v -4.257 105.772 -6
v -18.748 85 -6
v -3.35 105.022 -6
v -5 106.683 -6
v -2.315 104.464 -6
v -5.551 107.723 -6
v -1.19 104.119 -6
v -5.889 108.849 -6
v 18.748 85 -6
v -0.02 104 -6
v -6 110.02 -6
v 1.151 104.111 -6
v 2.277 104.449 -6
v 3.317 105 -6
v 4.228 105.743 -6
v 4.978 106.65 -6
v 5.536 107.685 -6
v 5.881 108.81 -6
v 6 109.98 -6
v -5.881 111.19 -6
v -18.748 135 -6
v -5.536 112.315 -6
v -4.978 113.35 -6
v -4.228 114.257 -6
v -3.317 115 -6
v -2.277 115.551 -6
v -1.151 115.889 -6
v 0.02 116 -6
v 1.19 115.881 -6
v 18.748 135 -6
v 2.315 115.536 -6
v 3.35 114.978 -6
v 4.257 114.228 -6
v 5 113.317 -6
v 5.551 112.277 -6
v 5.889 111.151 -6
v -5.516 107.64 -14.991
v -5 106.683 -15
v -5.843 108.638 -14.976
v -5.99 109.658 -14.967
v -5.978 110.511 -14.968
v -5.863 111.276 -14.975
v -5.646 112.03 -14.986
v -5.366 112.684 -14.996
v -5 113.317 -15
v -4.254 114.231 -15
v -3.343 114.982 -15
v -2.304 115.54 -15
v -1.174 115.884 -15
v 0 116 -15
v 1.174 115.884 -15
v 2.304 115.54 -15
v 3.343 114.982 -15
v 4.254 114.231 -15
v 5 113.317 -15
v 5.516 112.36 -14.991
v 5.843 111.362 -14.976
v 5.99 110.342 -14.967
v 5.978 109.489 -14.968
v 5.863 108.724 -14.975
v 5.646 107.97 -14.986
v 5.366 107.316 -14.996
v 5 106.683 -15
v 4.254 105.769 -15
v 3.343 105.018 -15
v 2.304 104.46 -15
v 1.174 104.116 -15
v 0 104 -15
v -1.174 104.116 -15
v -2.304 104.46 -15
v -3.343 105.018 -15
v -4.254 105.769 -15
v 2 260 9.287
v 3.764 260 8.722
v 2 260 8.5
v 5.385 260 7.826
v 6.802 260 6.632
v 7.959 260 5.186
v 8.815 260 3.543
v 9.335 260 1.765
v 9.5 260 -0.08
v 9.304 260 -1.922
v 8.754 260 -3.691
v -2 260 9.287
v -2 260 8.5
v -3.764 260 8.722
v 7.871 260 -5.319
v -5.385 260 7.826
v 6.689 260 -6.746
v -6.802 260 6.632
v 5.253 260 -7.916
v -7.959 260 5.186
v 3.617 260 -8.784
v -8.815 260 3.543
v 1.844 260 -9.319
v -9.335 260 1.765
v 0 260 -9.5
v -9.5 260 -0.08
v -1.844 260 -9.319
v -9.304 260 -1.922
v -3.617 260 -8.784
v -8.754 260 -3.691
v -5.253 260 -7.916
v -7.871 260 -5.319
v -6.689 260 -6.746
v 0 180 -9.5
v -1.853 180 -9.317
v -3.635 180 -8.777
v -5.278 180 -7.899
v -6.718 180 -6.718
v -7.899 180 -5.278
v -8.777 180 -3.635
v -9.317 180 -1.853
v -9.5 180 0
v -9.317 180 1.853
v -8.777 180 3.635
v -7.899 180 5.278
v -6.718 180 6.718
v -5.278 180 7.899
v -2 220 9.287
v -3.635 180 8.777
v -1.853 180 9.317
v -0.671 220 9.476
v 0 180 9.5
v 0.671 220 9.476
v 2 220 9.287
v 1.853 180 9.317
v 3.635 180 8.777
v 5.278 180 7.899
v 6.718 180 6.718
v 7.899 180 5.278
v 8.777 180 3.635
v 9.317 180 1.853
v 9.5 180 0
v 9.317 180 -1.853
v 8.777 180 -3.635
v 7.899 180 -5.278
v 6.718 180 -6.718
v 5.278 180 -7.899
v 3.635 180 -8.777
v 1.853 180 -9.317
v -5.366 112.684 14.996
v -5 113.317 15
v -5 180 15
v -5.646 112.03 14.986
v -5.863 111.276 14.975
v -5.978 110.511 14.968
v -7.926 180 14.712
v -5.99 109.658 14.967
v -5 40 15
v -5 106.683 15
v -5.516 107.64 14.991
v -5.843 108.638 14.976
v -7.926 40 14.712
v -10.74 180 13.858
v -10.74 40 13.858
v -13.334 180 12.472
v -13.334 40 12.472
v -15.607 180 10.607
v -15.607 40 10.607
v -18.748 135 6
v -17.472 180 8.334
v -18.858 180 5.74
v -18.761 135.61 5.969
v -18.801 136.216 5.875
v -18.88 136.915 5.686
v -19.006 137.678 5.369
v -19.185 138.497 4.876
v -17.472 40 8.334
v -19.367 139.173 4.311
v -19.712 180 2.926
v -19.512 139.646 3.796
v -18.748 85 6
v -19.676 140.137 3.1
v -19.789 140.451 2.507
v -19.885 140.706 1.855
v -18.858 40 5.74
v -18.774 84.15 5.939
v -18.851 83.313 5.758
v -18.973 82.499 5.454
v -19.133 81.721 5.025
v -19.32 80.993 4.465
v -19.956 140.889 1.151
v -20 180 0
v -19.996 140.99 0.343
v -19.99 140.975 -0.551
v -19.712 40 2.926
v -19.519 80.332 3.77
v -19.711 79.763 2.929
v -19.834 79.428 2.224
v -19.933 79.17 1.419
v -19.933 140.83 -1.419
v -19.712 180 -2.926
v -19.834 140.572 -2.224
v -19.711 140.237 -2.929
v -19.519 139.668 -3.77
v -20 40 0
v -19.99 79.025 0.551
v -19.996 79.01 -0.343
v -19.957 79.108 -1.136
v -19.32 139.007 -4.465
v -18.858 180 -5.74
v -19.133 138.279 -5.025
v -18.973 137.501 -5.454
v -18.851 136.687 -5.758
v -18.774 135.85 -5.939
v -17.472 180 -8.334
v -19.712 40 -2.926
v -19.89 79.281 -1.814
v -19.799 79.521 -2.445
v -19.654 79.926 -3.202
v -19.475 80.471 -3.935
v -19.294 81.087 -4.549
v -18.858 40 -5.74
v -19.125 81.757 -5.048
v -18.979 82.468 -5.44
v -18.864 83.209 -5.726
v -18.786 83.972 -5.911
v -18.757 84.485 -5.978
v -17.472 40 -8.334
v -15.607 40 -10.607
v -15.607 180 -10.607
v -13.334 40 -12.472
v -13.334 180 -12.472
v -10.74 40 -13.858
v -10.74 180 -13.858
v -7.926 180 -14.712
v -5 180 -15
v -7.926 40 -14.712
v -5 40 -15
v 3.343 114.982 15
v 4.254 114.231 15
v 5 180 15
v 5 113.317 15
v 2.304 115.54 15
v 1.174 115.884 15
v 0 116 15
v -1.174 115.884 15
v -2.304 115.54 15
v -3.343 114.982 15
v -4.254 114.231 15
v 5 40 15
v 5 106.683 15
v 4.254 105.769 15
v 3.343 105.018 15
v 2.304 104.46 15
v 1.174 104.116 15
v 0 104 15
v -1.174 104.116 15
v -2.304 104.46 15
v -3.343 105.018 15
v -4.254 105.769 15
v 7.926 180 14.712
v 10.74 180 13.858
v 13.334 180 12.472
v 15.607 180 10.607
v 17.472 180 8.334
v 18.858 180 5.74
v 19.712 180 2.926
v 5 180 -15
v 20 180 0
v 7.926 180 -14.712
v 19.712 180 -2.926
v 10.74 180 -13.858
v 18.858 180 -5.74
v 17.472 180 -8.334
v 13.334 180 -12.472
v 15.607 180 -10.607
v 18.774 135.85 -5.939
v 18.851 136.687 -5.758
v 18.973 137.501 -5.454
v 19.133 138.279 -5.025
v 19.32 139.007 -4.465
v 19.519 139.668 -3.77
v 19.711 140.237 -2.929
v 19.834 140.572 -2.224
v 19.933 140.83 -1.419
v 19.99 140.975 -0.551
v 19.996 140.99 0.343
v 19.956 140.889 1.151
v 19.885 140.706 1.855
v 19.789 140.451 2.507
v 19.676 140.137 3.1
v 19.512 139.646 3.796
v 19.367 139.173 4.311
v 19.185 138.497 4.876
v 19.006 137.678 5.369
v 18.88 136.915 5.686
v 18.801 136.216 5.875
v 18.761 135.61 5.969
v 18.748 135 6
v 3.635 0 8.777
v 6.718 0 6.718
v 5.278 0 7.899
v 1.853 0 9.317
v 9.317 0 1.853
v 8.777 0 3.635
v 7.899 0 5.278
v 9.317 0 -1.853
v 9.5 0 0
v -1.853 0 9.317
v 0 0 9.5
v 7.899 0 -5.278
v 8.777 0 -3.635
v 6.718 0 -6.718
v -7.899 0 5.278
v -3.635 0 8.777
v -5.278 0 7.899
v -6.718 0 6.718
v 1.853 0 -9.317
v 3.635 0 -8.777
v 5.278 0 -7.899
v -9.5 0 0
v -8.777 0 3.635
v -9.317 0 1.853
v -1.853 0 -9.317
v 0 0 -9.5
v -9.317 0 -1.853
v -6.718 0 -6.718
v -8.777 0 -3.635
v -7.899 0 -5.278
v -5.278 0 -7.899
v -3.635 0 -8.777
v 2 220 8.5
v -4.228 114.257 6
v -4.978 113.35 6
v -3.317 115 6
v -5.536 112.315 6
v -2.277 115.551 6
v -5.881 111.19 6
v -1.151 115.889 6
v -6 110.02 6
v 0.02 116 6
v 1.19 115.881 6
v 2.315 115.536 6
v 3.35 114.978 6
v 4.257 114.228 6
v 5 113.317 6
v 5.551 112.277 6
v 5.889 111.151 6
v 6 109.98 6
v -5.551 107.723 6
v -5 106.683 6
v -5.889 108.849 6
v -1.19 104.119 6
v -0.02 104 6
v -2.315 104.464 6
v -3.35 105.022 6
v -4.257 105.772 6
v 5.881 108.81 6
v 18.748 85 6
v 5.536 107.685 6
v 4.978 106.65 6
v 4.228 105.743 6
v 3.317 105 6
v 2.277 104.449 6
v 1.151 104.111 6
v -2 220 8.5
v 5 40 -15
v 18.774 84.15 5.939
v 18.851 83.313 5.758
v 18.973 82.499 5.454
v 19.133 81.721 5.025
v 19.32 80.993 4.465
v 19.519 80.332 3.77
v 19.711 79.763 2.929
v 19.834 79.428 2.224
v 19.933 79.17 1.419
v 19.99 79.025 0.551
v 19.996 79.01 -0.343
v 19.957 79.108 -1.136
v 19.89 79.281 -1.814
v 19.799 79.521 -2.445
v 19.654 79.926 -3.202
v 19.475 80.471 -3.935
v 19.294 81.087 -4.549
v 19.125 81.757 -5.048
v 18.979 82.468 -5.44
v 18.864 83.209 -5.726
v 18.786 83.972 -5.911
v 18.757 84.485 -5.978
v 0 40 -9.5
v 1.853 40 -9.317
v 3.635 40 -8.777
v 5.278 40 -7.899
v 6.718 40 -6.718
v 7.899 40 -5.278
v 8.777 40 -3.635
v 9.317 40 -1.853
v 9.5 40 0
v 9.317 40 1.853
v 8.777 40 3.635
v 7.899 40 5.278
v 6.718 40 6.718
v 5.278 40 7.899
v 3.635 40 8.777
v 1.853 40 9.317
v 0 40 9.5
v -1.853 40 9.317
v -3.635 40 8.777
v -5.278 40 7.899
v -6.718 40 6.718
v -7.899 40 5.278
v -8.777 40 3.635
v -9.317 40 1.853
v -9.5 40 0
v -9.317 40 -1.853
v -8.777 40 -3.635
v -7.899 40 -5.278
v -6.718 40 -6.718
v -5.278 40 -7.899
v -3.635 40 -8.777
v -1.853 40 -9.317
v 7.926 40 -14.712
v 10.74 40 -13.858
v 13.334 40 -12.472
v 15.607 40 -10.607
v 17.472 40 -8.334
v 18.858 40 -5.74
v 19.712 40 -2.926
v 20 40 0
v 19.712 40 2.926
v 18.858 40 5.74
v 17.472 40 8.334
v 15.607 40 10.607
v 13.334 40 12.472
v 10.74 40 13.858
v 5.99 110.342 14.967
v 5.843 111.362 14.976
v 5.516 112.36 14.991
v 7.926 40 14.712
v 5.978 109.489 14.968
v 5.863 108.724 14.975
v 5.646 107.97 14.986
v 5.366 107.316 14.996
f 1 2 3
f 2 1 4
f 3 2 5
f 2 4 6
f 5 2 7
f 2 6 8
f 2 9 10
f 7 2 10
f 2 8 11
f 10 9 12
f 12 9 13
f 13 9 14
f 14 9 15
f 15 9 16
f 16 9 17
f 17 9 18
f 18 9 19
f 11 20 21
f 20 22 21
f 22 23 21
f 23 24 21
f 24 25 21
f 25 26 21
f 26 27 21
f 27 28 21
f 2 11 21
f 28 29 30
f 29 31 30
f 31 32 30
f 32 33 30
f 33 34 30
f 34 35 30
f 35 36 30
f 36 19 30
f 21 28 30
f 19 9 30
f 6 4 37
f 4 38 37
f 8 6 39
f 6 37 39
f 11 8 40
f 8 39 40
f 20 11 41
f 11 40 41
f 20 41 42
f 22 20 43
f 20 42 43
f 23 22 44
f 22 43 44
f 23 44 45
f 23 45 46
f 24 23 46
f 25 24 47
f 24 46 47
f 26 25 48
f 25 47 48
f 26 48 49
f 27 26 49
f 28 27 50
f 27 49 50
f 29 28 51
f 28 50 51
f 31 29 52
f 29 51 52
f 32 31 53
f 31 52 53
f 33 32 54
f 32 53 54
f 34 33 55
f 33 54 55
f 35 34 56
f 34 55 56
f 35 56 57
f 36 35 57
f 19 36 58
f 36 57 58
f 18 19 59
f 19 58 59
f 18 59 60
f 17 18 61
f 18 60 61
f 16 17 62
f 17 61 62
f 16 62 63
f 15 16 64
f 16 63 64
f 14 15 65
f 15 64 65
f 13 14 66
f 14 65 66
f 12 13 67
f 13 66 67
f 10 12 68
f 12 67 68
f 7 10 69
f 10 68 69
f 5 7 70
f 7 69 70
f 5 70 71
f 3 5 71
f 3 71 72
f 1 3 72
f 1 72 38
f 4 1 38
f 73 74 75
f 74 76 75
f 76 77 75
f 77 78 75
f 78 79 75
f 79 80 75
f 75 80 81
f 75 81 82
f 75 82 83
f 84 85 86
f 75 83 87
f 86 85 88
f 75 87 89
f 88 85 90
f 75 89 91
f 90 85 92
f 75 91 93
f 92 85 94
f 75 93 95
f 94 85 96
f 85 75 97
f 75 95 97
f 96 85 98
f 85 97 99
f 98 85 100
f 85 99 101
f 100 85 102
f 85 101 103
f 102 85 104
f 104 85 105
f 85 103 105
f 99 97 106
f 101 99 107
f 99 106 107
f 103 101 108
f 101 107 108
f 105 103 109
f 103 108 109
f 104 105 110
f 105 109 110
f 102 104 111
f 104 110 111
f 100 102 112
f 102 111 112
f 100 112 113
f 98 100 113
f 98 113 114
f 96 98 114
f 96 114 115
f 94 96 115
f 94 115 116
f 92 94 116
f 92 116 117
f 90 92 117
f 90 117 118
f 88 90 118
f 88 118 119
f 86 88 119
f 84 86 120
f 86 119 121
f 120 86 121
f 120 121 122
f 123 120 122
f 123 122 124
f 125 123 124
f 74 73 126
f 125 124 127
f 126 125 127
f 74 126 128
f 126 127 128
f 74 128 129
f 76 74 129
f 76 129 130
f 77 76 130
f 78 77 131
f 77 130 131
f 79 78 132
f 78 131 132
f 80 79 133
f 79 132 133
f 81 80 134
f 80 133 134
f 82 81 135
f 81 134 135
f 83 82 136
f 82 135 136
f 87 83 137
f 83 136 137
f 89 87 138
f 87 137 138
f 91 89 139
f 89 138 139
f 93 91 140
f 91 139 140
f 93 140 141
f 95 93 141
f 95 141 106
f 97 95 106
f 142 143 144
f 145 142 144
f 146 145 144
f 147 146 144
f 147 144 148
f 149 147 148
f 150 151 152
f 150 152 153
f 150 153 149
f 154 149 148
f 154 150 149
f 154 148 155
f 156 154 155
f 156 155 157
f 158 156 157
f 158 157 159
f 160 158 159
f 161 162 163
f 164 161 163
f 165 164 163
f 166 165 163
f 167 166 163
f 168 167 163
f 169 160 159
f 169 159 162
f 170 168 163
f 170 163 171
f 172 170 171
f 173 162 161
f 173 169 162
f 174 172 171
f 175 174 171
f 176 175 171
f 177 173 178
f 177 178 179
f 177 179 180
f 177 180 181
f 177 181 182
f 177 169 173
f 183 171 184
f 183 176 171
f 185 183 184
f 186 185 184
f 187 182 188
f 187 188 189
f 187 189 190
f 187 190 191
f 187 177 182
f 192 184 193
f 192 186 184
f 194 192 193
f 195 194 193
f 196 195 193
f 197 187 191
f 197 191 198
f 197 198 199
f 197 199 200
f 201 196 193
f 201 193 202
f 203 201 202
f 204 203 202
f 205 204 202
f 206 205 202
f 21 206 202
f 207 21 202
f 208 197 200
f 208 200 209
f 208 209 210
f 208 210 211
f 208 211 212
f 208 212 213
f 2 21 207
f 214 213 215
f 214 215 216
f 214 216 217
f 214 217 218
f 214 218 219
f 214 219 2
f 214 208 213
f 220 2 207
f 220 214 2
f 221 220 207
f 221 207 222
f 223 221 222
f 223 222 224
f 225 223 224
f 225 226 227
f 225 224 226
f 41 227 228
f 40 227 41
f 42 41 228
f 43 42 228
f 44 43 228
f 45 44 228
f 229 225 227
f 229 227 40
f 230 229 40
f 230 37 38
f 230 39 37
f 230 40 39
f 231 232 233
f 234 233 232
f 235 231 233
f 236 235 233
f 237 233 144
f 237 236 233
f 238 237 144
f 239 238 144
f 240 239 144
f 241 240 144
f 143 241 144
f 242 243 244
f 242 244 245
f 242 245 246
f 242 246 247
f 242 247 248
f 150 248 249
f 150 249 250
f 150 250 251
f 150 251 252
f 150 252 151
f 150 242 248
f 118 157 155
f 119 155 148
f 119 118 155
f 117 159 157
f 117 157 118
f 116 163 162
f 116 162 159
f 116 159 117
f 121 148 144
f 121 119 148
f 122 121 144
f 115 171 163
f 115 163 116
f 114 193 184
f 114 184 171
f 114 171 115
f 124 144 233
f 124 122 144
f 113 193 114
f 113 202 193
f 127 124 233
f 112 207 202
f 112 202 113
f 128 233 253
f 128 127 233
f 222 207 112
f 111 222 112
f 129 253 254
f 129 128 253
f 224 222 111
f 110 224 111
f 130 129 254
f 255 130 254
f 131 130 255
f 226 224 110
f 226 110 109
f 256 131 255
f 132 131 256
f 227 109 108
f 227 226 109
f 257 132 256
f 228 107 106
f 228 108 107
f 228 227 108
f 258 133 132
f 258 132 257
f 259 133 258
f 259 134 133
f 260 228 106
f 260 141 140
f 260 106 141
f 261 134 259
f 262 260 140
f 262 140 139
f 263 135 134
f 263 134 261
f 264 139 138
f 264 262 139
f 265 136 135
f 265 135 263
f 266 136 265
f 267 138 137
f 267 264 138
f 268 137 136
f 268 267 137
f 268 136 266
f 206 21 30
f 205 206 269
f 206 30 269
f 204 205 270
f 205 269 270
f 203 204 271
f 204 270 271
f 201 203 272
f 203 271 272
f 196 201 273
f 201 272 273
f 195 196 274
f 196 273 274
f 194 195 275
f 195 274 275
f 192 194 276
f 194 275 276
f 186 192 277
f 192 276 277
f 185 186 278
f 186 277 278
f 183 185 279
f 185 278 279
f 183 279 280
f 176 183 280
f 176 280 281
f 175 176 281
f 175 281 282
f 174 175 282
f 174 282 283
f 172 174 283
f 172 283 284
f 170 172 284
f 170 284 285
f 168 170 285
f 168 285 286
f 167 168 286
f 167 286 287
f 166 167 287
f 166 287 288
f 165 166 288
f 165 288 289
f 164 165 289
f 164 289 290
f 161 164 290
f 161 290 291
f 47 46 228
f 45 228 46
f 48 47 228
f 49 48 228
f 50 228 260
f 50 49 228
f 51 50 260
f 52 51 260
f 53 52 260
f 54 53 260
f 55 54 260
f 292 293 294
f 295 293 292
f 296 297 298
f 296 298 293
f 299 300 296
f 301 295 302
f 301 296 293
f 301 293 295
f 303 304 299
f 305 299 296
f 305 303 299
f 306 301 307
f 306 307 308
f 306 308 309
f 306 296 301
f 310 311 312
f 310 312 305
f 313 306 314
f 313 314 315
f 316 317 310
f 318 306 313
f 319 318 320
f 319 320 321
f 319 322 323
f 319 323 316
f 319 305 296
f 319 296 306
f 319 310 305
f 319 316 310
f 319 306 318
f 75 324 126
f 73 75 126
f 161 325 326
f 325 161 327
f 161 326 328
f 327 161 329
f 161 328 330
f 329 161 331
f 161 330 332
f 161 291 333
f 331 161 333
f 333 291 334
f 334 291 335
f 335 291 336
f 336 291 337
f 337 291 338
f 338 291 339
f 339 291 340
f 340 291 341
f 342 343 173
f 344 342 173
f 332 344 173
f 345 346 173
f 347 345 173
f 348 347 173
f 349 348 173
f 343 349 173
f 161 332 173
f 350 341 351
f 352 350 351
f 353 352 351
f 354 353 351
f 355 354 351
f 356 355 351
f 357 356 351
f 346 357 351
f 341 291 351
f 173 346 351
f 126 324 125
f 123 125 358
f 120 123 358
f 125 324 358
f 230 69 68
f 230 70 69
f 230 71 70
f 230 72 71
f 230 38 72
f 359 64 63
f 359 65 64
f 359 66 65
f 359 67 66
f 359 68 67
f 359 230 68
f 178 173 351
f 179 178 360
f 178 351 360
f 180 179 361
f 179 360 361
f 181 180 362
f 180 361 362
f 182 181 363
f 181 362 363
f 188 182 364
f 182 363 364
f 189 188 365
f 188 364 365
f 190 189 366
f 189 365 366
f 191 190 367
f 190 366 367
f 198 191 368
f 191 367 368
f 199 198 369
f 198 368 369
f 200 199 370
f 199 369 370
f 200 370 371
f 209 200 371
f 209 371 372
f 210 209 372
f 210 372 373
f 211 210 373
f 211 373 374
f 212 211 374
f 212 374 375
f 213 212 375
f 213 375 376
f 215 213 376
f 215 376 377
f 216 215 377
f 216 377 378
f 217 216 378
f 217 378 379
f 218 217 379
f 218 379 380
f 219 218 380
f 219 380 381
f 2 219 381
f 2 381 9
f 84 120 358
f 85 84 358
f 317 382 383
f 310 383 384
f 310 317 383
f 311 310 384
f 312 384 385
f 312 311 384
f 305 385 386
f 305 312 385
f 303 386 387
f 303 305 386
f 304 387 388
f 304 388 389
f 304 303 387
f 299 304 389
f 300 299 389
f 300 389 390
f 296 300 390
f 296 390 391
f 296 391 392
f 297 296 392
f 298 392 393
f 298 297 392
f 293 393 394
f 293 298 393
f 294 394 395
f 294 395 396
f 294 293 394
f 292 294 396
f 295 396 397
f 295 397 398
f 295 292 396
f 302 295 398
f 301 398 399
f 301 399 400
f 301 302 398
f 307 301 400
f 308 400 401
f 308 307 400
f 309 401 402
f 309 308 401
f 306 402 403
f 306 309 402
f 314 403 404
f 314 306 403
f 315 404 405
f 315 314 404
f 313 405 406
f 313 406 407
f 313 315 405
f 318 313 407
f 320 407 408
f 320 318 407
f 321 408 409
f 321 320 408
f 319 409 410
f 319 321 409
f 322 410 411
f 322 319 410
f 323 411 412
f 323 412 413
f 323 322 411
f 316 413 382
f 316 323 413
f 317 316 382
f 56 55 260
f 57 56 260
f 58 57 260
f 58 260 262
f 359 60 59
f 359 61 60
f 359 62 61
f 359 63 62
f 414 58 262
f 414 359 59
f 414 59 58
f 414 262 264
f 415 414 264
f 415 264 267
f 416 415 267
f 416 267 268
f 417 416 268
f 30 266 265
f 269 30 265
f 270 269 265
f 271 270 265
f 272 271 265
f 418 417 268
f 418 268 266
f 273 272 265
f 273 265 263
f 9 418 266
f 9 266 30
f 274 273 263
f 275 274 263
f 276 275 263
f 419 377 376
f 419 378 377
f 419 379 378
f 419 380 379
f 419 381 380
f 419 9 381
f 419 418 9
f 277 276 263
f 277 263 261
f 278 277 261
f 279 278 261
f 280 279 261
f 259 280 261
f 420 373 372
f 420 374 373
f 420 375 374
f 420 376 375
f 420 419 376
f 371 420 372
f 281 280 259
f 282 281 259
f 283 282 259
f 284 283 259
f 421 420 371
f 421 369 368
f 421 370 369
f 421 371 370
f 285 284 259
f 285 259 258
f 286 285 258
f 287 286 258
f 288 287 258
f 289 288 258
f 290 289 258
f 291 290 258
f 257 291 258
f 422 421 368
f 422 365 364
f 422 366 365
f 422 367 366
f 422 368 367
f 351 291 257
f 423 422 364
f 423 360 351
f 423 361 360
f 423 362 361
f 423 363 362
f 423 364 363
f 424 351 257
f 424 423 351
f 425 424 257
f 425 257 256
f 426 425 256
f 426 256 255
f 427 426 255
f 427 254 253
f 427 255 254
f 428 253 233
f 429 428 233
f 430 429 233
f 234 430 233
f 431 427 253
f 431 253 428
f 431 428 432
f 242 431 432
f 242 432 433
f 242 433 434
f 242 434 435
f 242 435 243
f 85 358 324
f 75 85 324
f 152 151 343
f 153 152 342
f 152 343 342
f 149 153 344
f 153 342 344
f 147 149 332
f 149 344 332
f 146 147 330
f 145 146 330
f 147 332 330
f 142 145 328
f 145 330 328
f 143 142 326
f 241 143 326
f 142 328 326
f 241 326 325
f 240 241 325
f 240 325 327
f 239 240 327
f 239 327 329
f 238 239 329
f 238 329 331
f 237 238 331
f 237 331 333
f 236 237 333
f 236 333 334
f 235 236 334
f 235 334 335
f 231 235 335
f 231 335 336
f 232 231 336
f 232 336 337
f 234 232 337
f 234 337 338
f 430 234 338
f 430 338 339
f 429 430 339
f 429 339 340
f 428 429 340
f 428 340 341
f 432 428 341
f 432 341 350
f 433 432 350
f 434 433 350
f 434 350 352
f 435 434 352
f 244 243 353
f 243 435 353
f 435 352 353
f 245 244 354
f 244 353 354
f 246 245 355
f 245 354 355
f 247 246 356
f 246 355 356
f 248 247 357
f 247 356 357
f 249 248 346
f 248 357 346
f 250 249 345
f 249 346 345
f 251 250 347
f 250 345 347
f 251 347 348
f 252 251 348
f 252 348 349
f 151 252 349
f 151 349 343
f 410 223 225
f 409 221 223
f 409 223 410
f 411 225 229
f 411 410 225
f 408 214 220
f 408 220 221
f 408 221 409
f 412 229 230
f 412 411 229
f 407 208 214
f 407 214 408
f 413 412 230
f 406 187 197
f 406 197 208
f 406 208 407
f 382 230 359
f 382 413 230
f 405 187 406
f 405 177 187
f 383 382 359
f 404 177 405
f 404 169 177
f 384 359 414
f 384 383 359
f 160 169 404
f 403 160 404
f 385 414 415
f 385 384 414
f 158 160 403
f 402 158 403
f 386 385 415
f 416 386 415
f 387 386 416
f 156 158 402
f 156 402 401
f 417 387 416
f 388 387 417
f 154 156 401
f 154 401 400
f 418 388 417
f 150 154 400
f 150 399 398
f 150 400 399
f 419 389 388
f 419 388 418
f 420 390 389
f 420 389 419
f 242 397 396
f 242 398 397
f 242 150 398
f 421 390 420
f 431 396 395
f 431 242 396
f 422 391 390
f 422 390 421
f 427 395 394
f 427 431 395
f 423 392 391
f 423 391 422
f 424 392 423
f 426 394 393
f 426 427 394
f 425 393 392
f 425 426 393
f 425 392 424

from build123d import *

# Parameters (mm, degrees)
ESTRUSIONE_ESTRUSIONE1_DEPTH  = 260
SCHIZZO2_R                    = 9.5
TAGLIO_ESTRUSIONE1_DEPTH      = 40
TAGLIO_ESTRUSIONE2_START      = -80
SCHIZZO3_R                    = 9.5
TAGLIO_ESTRUSIONE2_DEPTH      = 80
TAGLIO_ESTRUSIONE3_DEPTH      = 263.488094968
TAGLIO_ESTRUSIONE3_DEPTH_BACK = 263.488094968
SCHIZZO5_R                    = 6
TAGLIO_ESTRUSIONE4_DEPTH      = 80
TAGLIO_ESTRUSIONE5_START      = -40
TAGLIO_ESTRUSIONE5_DEPTH      = 40


with BuildPart() as part:
    # Schizzo1 → Estrusione-Estrusione1 (new body)
    with BuildSketch(Plane(origin=(0, 0, 0), x_dir=(1, 0, 0), z_dir=(0, 1, 0))):
        with BuildLine():
            Line((-5, 15), (5, 15))
            ThreePointArc((5, 15), (20, 0), (5, -15))
            Line((5, -15), (-5, -15))
            ThreePointArc((-5, -15), (-20, 0), (-5, 15))
        make_face()
    extrude(amount=ESTRUSIONE_ESTRUSIONE1_DEPTH)

    # Schizzo2 → Taglio-Estrusione1 (cut)
    with BuildSketch(Plane.XZ):
        with BuildLine():
            Line((-5, -15), (5, -15))
            ThreePointArc((5, -15), (20, 0), (5, 15))
            Line((5, 15), (-5, 15))
            ThreePointArc((-5, 15), (-20, 0), (-5, -15))
        make_face()
        with Locations(Location((0, 0, 0), (0, 0, 270))):
            Circle(SCHIZZO2_R, mode=Mode.SUBTRACT)
    extrude(amount=-TAGLIO_ESTRUSIONE1_DEPTH, mode=Mode.SUBTRACT)

    # Schizzo3 → Taglio-Estrusione2 (cut)
    with BuildSketch(Plane(origin=(0, 260, 0), x_dir=(1, 0, 0), z_dir=(0, 1, 0)).offset(TAGLIO_ESTRUSIONE2_START)):
        with BuildLine():
            Line((-5, -15), (5, -15))
            ThreePointArc((5, -15), (20, 0), (5, 15))
            Line((5, 15), (-5, 15))
            ThreePointArc((-5, 15), (-20, 0), (-5, -15))
        make_face()
        with Locations(Location((0, 0, 0), (0, 0, 90))):
            Circle(SCHIZZO3_R, mode=Mode.SUBTRACT)
    extrude(amount=TAGLIO_ESTRUSIONE2_DEPTH, mode=Mode.SUBTRACT)

    # Schizzo4 → Taglio-Estrusione3 (cut, two sides: drawn at the far end of the back side and taken through both)
    with BuildSketch(Plane(origin=(0, 0, 15), x_dir=(0, 0, 1), z_dir=(-1, 0, 0)).offset(-TAGLIO_ESTRUSIONE3_DEPTH_BACK)):
        with BuildLine():
            Line((-9, 135), (-9, 85))
            ThreePointArc((-9, 85), (-15, 79), (-21, 85))
            Line((-21, 85), (-21, 135))
            ThreePointArc((-21, 135), (-15, 141), (-9, 135))
        make_face()
    extrude(amount=TAGLIO_ESTRUSIONE3_DEPTH + TAGLIO_ESTRUSIONE3_DEPTH_BACK, mode=Mode.SUBTRACT)

    # Schizzo5 → Taglio-Estrusione4 (cut)
    with BuildSketch(Plane(origin=(0, 0, -15), x_dir=(-1, 0, 0), z_dir=(0, 0, -1))):
        with Locations(Location((0, 110, 0), (0, 0, 326.442690238))):
            Circle(SCHIZZO5_R)
    extrude(amount=-TAGLIO_ESTRUSIONE4_DEPTH, mode=Mode.SUBTRACT)

    # Schizzo6 → Taglio-Estrusione5 (cut)
    with BuildSketch(Plane(origin=(0, 260, 0), x_dir=(1, 0, 0), z_dir=(0, 1, 0)).offset(TAGLIO_ESTRUSIONE5_START)):
        with BuildLine():
            Line((-2, -9.287087811), (-2, -8.5))
            Line((-2, -8.5), (2, -8.5))
            Line((2, -8.5), (2, -9.287087811))
            ThreePointArc((2, -9.287087811), (0, -9.5), (-2, -9.287087811))
        make_face()
    extrude(amount=TAGLIO_ESTRUSIONE5_DEPTH, mode=Mode.SUBTRACT)


solid = part.part
